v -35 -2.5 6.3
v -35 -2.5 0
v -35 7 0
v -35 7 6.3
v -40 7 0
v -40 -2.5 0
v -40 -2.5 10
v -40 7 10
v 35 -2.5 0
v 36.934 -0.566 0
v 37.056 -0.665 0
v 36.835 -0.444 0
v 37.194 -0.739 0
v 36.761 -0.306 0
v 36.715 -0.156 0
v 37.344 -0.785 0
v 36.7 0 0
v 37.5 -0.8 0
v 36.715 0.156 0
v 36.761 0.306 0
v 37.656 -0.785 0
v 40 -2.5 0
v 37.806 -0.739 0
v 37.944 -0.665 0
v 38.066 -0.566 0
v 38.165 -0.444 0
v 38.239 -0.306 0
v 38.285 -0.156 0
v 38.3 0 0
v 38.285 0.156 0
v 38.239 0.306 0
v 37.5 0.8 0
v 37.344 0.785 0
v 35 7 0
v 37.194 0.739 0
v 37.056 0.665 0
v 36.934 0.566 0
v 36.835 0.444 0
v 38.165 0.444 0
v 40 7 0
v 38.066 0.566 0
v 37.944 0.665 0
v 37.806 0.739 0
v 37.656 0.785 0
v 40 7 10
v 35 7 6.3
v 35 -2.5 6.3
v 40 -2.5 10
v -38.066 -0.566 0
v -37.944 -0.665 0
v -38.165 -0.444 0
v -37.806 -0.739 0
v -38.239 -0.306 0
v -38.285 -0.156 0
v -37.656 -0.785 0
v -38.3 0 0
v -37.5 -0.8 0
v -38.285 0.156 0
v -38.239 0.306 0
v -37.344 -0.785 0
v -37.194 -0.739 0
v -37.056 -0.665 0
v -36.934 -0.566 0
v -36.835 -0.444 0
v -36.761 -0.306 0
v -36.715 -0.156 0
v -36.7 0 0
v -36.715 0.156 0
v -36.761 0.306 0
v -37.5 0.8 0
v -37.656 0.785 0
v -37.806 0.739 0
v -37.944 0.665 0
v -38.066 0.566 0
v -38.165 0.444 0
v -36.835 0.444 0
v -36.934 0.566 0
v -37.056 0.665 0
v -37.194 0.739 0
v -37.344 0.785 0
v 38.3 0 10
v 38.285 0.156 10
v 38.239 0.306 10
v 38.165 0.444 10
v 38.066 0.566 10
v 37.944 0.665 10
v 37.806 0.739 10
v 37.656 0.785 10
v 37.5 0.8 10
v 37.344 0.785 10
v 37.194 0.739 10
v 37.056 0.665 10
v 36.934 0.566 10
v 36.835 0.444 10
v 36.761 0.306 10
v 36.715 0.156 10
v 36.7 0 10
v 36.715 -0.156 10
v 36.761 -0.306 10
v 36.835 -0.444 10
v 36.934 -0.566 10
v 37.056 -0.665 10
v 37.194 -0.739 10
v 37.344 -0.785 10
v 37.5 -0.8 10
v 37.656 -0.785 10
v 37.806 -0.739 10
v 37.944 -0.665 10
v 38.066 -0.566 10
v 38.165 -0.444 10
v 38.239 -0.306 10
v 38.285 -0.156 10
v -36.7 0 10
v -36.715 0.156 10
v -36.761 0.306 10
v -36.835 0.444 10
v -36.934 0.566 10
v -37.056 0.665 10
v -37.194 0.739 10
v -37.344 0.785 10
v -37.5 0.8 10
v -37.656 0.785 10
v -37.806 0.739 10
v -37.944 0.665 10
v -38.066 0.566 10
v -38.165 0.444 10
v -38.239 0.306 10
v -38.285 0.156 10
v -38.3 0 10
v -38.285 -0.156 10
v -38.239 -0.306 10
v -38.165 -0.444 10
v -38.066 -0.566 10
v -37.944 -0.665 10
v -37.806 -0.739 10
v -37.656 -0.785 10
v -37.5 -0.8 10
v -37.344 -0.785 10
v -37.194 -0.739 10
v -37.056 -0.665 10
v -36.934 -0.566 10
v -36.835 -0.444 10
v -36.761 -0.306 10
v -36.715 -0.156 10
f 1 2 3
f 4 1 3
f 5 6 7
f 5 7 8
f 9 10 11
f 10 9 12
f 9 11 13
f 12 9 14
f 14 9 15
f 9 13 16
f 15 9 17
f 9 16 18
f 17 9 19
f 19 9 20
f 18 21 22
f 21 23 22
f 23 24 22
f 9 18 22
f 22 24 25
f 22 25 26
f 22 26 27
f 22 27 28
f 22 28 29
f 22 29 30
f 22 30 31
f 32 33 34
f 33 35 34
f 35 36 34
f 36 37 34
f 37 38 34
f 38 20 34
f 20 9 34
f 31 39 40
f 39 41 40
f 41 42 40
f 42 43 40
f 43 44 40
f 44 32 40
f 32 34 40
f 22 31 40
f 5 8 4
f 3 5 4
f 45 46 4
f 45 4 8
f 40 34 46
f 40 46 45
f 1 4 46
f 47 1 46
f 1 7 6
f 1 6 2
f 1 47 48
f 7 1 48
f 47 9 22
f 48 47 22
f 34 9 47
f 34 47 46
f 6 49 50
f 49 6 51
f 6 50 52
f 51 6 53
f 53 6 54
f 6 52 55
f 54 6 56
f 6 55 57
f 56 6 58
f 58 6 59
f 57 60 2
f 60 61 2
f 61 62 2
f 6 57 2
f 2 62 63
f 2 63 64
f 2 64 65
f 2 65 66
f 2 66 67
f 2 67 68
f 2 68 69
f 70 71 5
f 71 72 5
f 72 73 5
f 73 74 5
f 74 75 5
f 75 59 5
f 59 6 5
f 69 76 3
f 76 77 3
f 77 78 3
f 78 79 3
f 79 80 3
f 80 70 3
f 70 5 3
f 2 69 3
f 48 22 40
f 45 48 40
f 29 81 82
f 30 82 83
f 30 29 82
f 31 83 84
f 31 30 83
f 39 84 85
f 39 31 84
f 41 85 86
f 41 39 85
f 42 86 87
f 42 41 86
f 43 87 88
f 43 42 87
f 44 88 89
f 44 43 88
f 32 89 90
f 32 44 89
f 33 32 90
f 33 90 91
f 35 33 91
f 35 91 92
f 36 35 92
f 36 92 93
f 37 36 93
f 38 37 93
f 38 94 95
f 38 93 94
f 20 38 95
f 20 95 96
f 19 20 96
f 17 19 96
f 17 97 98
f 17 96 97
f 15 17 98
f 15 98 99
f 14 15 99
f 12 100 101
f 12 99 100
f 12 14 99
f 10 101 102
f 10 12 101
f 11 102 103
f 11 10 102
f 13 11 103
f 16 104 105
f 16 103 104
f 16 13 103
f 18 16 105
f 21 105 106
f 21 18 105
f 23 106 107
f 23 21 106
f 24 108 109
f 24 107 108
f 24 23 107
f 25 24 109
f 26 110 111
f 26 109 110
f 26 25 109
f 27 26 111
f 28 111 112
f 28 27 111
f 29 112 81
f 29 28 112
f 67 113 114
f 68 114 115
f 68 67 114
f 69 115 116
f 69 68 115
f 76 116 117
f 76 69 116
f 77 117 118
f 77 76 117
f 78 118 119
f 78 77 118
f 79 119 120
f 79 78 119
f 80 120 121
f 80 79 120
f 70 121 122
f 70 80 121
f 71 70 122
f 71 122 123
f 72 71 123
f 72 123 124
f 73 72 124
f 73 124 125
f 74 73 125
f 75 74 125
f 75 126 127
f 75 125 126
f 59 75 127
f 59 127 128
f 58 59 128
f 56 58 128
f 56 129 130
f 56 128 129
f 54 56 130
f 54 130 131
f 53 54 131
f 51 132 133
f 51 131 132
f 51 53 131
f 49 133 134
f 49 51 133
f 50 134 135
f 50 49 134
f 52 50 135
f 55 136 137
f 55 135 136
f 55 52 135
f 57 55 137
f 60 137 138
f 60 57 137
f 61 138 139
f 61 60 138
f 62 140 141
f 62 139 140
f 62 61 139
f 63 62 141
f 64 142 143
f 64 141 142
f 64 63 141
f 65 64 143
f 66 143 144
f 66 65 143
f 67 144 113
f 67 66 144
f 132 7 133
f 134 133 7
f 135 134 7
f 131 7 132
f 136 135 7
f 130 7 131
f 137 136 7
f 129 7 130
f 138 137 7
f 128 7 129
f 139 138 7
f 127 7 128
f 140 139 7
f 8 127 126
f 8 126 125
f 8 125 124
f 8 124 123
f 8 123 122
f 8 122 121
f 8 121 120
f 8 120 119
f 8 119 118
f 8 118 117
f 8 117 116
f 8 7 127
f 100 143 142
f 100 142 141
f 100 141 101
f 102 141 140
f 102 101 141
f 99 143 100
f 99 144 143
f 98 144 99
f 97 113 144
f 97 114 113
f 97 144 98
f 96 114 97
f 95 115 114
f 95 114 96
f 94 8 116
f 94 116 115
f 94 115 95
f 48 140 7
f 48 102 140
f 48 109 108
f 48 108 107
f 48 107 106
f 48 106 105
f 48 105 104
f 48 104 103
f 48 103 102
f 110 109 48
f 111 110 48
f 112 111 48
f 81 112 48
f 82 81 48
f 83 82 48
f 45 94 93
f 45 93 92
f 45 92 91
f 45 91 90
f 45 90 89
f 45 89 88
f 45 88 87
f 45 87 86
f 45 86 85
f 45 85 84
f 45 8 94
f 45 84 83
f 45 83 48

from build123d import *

# Parameters (mm, degrees)
SKETCH_W     = 80
SKETCH_H     = 9.5
PAD_DEPTH    = 10
SKETCH001_W  = 70
SKETCH001_H  = 25
POCKET_DEPTH = 6.3
SKETCH002_R  = 0.8
HOLE_DEPTH   = 10.001


with BuildPart() as part:
    # Sketch → Pad (new body)
    with BuildSketch(Plane.XY):
        with Locations((0, 2.25)):
            Rectangle(SKETCH_W, SKETCH_H)
    extrude(amount=PAD_DEPTH)

    # Sketch001 → Pocket (cut)
    with BuildSketch(Plane.XY):
        with Locations((0, -1.444008)):
            Rectangle(SKETCH001_W, SKETCH001_H)
    extrude(amount=POCKET_DEPTH, mode=Mode.SUBTRACT)

    # Sketch002 → Hole (cut, through all)
    with BuildSketch(Plane.XY):
        with Locations((37.5, 0)):
            Circle(SKETCH002_R)
        with Locations((-37.5, 0)):
            Circle(SKETCH002_R)
    extrude(amount=HOLE_DEPTH, mode=Mode.SUBTRACT)


solid = part.part
